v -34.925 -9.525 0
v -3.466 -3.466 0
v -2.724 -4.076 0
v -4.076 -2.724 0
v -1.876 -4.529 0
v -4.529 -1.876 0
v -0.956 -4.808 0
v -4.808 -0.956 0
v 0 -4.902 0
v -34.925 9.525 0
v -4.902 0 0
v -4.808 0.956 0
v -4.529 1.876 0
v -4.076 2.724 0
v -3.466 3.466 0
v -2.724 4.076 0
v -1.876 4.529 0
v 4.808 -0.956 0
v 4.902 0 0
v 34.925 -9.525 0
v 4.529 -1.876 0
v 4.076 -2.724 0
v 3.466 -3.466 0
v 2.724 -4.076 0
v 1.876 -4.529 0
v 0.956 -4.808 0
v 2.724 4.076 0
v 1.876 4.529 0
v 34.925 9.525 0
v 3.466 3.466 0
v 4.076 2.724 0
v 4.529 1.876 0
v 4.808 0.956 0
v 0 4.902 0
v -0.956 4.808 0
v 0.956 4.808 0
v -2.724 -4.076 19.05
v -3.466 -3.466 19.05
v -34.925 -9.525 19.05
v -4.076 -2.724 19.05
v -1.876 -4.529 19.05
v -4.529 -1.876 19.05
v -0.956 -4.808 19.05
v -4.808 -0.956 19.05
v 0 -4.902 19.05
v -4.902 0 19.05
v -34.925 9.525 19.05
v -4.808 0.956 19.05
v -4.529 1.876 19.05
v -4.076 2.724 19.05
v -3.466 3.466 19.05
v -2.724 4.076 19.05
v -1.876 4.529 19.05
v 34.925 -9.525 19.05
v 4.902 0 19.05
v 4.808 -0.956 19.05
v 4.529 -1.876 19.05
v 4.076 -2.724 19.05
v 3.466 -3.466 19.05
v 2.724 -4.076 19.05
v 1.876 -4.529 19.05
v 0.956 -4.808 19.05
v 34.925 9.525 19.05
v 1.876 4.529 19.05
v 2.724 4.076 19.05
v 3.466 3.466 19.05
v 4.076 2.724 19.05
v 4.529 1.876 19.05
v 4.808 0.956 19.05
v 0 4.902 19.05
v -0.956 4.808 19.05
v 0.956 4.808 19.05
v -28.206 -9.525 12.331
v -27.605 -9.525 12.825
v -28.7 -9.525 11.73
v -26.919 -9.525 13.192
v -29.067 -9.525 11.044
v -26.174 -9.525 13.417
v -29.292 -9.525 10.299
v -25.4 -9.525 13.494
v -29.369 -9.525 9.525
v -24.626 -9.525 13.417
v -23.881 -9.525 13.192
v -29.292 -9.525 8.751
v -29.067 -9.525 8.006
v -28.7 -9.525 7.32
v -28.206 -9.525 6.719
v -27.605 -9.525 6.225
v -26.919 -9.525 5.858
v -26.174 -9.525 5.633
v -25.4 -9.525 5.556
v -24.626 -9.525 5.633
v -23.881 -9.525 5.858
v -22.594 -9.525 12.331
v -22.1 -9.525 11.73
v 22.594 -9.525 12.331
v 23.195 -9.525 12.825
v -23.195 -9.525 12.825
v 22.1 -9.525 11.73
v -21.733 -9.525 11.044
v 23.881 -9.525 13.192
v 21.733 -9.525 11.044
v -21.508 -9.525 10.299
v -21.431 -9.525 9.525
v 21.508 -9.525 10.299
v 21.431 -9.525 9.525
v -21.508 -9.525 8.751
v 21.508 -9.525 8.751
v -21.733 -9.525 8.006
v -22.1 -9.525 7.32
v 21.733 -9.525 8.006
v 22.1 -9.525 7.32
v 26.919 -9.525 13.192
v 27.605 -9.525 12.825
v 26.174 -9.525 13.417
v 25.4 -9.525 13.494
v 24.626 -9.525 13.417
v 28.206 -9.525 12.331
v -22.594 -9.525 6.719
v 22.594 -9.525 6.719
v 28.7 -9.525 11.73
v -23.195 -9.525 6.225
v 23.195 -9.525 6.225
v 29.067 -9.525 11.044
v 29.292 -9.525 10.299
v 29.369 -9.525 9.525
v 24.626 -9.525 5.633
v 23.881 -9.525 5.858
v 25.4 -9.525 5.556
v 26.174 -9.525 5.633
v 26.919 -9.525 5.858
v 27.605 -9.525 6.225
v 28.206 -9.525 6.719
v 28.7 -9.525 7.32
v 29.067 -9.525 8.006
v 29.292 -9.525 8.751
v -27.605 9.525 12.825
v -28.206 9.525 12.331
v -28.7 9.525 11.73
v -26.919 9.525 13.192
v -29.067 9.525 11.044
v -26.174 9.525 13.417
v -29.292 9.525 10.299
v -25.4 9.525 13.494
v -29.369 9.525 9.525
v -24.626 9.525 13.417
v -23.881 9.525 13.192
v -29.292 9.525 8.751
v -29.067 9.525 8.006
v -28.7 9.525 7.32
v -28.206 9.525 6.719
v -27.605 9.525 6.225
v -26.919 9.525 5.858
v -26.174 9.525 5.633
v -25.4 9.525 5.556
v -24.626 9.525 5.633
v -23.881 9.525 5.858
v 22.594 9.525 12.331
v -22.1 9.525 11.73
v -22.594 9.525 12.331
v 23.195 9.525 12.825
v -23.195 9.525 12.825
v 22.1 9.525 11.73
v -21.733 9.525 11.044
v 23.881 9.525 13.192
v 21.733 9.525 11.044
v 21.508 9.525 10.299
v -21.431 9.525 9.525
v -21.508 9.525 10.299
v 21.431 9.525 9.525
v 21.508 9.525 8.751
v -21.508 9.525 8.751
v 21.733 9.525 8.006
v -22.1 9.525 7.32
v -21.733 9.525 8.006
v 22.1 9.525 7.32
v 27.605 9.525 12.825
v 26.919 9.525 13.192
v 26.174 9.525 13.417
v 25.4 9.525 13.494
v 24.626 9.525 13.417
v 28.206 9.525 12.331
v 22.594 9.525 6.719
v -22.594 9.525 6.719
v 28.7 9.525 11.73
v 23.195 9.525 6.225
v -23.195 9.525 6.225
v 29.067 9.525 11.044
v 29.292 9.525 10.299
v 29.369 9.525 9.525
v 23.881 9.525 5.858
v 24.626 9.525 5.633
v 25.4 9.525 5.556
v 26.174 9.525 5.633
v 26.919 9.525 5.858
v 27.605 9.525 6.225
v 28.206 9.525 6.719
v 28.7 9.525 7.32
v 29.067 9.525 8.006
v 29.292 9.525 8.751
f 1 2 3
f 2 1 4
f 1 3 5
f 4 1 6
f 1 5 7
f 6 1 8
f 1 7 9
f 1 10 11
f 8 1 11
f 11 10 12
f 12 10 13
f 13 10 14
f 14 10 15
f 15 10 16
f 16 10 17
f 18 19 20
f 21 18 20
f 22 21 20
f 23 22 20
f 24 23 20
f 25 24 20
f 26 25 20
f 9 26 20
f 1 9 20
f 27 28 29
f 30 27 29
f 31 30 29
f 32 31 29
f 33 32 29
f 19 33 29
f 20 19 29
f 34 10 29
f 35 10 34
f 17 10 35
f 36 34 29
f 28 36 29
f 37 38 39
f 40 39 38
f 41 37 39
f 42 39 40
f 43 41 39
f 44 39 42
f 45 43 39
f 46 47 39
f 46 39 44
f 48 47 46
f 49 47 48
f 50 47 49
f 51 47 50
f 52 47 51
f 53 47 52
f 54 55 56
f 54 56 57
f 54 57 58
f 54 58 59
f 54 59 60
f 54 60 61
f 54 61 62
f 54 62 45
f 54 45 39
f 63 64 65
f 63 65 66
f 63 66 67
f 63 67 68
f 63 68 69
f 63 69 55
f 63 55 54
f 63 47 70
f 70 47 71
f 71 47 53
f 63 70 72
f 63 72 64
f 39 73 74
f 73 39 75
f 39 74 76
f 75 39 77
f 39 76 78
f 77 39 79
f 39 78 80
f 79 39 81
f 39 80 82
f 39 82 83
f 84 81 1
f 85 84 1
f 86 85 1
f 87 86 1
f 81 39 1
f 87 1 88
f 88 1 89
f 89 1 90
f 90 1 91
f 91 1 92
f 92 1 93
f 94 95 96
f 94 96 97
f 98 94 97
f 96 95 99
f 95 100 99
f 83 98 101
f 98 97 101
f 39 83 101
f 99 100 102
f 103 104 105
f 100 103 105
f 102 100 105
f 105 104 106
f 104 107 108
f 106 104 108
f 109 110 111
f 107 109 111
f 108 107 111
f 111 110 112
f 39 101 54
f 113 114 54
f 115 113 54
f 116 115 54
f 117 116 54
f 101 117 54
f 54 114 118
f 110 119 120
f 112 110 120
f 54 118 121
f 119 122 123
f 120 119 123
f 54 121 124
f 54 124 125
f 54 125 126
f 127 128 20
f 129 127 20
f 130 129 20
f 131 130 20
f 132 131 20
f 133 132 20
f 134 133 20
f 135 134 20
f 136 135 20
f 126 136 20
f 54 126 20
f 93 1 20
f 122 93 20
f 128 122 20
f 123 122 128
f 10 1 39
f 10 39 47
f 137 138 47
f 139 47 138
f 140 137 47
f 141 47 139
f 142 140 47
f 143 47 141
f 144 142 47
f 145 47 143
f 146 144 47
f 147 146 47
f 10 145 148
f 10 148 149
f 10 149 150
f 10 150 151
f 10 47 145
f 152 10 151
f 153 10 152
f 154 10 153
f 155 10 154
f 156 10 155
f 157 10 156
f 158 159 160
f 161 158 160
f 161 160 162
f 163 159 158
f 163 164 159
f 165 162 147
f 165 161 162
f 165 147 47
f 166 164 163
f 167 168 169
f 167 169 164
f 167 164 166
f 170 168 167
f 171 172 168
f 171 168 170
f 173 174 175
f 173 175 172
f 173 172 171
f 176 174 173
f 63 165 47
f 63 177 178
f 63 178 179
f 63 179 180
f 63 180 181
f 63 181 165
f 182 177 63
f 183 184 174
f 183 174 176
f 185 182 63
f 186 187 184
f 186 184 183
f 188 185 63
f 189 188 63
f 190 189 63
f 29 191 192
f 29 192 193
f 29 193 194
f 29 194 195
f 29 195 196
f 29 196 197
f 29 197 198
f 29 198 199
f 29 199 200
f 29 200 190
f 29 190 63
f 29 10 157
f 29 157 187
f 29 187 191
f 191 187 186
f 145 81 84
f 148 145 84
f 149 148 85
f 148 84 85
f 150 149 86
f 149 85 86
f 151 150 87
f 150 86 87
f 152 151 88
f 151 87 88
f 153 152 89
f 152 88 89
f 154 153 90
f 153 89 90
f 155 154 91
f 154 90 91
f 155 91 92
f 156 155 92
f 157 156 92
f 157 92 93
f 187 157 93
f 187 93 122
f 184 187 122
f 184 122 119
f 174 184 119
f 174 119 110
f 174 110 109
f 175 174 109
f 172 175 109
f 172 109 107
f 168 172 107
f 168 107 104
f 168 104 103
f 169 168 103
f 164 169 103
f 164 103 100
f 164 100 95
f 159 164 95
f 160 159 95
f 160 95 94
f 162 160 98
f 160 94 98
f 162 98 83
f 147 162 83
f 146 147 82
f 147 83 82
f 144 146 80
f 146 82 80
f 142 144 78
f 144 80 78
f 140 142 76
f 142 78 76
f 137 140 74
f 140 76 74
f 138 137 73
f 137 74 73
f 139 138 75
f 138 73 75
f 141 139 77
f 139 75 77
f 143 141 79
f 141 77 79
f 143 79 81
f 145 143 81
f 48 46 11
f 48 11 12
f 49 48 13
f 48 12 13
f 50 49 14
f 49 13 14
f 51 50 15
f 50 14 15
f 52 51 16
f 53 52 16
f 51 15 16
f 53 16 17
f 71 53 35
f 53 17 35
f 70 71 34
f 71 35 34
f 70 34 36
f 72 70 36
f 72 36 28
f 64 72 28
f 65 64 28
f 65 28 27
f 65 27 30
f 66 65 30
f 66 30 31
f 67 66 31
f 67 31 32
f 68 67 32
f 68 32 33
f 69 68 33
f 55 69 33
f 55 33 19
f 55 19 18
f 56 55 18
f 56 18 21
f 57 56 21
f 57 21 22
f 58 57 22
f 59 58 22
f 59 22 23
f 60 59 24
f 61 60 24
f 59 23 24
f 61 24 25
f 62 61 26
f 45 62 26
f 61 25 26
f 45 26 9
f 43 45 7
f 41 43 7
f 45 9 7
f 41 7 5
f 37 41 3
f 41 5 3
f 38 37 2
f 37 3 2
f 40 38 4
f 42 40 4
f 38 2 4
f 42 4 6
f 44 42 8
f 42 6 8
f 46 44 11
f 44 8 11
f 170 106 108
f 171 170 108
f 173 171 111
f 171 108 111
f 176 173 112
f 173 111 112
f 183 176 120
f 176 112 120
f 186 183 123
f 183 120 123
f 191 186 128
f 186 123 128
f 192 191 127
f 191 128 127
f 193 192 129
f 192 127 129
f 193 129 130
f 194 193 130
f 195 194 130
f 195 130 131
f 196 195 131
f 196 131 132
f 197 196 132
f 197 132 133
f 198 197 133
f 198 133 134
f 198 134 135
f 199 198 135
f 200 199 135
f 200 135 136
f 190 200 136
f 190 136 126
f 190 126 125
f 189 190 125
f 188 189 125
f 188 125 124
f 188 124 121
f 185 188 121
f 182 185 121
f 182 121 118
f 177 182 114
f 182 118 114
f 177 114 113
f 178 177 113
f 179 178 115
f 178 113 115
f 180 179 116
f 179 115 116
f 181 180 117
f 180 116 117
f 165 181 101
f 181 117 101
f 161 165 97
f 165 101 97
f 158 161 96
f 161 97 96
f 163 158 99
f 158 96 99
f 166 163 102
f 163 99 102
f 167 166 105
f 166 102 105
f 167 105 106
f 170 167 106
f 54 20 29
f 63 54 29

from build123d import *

# Parameters (mm, degrees)
SKETCH1_W                      = 69.85
SKETCH1_H                      = 19.05
BOSS_EXTRUDE1_DEPTH            = 19.05
F_3_8_CLEARANCE_HOLE1_D        = 9.8044
F_5_16_0_3125_DIAMETER_HOLE1_D = 7.9375


with BuildPart() as part:
    # Sketch1 → Boss-Extrude1 (new body)
    with BuildSketch(Plane.XY):
        Rectangle(SKETCH1_W, SKETCH1_H)
    extrude(amount=BOSS_EXTRUDE1_DEPTH)

    # 3/8 Clearance Hole1 (through all)
    with Locations(Plane.XY.offset(19.05)):
        with Locations((0, 0)):
            Hole(F_3_8_CLEARANCE_HOLE1_D / 2)

    # 5/16 (0.3125) Diameter Hole1 (through all)
    with Locations(Plane(origin=(0, 9.525, 0), x_dir=(1, 0, 0), z_dir=(0, 1, 0))):
        with Locations((-25.4, -9.525), (25.4, -9.525)):
            Hole(F_5_16_0_3125_DIAMETER_HOLE1_D / 2)


solid = part.part
